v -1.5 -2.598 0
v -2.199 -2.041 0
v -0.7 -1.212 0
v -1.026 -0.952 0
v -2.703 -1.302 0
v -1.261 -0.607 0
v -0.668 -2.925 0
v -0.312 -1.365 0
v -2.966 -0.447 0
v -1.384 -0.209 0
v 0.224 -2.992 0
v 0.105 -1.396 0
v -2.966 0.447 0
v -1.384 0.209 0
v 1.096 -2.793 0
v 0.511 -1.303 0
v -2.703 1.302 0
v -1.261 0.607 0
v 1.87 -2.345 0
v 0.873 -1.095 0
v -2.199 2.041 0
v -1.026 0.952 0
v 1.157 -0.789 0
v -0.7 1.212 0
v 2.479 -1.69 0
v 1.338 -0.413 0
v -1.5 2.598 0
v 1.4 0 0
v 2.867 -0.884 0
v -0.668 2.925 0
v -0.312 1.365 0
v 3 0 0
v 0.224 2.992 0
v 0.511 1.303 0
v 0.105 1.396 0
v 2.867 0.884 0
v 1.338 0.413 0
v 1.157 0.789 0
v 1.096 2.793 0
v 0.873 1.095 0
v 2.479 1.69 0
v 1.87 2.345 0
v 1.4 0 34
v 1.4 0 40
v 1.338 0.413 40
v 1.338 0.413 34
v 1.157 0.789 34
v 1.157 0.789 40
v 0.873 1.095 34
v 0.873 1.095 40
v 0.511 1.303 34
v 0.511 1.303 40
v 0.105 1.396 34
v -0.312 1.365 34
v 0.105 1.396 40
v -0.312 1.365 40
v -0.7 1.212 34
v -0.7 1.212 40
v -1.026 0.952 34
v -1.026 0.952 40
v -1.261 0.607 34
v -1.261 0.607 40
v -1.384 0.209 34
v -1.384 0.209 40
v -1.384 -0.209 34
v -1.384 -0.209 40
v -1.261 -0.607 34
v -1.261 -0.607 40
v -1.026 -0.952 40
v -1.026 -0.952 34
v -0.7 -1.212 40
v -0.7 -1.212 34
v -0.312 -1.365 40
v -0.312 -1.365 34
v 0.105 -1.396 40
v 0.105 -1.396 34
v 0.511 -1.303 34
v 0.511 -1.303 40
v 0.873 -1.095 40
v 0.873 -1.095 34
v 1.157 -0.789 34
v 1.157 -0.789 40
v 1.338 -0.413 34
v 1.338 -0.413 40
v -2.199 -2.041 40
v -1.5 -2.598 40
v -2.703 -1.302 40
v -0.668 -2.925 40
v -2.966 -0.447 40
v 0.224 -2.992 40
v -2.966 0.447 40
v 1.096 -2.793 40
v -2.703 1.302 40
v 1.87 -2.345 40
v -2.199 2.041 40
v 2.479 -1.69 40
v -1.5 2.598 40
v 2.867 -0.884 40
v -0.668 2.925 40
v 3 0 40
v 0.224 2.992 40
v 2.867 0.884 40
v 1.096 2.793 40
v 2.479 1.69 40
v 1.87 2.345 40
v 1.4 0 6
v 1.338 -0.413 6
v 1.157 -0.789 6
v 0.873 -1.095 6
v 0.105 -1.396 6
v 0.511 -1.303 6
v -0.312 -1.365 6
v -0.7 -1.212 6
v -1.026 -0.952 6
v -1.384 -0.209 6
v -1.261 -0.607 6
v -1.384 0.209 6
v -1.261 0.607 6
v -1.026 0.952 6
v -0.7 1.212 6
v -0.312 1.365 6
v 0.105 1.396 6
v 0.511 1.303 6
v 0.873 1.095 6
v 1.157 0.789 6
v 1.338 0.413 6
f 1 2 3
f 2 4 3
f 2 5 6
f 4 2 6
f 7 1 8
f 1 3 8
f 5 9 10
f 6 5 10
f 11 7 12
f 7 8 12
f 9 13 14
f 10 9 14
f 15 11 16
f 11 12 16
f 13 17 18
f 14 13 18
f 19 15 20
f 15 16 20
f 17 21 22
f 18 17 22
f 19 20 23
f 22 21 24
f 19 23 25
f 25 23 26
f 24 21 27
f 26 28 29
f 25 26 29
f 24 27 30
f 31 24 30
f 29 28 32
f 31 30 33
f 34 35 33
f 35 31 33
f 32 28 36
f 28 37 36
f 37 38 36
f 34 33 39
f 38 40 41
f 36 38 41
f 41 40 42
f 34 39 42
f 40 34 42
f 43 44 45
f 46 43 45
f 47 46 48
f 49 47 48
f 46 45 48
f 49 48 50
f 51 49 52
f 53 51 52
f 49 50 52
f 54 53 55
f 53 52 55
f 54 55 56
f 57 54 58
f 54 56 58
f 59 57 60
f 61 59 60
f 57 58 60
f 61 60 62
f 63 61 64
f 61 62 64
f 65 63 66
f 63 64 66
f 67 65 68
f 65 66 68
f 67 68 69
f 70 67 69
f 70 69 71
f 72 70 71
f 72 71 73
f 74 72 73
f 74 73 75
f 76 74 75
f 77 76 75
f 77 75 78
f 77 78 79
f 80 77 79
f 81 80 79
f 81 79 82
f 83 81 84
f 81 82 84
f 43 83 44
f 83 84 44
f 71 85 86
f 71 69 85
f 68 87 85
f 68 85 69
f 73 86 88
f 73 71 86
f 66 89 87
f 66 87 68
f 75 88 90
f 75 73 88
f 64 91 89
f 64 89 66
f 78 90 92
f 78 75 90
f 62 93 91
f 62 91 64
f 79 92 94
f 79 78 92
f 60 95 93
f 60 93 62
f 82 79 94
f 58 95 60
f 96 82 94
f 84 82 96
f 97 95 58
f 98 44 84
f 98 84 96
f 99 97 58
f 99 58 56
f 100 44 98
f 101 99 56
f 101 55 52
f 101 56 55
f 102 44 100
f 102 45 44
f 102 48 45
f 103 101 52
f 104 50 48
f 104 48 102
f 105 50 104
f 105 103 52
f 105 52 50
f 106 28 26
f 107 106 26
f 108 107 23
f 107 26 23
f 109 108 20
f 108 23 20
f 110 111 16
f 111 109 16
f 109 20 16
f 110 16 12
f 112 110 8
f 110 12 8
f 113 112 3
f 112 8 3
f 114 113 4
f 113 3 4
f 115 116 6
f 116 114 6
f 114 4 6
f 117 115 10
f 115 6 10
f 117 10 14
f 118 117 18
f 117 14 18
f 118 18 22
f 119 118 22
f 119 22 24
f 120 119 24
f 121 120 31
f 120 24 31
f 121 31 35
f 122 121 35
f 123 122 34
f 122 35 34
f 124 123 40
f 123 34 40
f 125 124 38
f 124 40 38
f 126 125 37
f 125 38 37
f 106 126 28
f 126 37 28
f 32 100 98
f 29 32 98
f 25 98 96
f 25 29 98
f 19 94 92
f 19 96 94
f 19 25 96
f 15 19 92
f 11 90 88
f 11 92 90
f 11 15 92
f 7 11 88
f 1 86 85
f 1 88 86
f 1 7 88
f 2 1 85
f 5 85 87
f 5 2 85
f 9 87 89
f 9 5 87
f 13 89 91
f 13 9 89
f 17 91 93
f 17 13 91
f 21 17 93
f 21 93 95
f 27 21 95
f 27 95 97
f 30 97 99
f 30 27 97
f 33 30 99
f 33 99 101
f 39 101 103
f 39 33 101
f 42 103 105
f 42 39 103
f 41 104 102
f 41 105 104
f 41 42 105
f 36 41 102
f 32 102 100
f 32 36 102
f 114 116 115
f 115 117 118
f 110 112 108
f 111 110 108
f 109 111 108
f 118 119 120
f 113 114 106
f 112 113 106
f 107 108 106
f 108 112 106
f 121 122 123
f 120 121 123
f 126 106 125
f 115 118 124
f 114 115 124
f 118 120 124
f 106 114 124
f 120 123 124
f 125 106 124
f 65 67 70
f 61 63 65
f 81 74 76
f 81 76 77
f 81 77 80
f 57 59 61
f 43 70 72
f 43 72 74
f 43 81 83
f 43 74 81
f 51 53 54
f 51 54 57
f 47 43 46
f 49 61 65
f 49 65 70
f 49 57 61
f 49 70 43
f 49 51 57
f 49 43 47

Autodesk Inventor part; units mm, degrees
ref_plane "YZ Plane" through (0, 0, 0) normal (1, 0, 0) x (0, 1, 0)
ref_plane "XZ Plane" through (0, 0, 0) normal (0, 1, 0) x (-1, 0, 0)
ref_plane "XY Plane" through (0, 0, 0) normal (0, 0, 1) x (1, 0, 0)
sketch "スケッチ1" plane through (0, 0, 0) normal (0, 0, 1) x (1, 0, 0)
  circle A0 centre (0, 0) radius 1.4
  circle A1 centre (0, 0) radius 3
  dimension "d0" = 2.8
  dimension "d1" = 6
extrude "押し出し1" add sketch "スケッチ1" along normal blind 40 contours A0 | A1
sketch "スケッチ2" plane through (0, 0, 40) normal (0, 0, 1) x (1, 0, 0)
  circle A0 centre (0, 0) radius 1.4
  dimension "d4" = 2.8
extrude "押し出し2" cut sketch "スケッチ2" against normal blind 6
extrude "押し出し3" cut sketch "スケッチ1" along normal blind 6 contours A0
properties part number "40mm" material "アルミニウム 2014-T4"
